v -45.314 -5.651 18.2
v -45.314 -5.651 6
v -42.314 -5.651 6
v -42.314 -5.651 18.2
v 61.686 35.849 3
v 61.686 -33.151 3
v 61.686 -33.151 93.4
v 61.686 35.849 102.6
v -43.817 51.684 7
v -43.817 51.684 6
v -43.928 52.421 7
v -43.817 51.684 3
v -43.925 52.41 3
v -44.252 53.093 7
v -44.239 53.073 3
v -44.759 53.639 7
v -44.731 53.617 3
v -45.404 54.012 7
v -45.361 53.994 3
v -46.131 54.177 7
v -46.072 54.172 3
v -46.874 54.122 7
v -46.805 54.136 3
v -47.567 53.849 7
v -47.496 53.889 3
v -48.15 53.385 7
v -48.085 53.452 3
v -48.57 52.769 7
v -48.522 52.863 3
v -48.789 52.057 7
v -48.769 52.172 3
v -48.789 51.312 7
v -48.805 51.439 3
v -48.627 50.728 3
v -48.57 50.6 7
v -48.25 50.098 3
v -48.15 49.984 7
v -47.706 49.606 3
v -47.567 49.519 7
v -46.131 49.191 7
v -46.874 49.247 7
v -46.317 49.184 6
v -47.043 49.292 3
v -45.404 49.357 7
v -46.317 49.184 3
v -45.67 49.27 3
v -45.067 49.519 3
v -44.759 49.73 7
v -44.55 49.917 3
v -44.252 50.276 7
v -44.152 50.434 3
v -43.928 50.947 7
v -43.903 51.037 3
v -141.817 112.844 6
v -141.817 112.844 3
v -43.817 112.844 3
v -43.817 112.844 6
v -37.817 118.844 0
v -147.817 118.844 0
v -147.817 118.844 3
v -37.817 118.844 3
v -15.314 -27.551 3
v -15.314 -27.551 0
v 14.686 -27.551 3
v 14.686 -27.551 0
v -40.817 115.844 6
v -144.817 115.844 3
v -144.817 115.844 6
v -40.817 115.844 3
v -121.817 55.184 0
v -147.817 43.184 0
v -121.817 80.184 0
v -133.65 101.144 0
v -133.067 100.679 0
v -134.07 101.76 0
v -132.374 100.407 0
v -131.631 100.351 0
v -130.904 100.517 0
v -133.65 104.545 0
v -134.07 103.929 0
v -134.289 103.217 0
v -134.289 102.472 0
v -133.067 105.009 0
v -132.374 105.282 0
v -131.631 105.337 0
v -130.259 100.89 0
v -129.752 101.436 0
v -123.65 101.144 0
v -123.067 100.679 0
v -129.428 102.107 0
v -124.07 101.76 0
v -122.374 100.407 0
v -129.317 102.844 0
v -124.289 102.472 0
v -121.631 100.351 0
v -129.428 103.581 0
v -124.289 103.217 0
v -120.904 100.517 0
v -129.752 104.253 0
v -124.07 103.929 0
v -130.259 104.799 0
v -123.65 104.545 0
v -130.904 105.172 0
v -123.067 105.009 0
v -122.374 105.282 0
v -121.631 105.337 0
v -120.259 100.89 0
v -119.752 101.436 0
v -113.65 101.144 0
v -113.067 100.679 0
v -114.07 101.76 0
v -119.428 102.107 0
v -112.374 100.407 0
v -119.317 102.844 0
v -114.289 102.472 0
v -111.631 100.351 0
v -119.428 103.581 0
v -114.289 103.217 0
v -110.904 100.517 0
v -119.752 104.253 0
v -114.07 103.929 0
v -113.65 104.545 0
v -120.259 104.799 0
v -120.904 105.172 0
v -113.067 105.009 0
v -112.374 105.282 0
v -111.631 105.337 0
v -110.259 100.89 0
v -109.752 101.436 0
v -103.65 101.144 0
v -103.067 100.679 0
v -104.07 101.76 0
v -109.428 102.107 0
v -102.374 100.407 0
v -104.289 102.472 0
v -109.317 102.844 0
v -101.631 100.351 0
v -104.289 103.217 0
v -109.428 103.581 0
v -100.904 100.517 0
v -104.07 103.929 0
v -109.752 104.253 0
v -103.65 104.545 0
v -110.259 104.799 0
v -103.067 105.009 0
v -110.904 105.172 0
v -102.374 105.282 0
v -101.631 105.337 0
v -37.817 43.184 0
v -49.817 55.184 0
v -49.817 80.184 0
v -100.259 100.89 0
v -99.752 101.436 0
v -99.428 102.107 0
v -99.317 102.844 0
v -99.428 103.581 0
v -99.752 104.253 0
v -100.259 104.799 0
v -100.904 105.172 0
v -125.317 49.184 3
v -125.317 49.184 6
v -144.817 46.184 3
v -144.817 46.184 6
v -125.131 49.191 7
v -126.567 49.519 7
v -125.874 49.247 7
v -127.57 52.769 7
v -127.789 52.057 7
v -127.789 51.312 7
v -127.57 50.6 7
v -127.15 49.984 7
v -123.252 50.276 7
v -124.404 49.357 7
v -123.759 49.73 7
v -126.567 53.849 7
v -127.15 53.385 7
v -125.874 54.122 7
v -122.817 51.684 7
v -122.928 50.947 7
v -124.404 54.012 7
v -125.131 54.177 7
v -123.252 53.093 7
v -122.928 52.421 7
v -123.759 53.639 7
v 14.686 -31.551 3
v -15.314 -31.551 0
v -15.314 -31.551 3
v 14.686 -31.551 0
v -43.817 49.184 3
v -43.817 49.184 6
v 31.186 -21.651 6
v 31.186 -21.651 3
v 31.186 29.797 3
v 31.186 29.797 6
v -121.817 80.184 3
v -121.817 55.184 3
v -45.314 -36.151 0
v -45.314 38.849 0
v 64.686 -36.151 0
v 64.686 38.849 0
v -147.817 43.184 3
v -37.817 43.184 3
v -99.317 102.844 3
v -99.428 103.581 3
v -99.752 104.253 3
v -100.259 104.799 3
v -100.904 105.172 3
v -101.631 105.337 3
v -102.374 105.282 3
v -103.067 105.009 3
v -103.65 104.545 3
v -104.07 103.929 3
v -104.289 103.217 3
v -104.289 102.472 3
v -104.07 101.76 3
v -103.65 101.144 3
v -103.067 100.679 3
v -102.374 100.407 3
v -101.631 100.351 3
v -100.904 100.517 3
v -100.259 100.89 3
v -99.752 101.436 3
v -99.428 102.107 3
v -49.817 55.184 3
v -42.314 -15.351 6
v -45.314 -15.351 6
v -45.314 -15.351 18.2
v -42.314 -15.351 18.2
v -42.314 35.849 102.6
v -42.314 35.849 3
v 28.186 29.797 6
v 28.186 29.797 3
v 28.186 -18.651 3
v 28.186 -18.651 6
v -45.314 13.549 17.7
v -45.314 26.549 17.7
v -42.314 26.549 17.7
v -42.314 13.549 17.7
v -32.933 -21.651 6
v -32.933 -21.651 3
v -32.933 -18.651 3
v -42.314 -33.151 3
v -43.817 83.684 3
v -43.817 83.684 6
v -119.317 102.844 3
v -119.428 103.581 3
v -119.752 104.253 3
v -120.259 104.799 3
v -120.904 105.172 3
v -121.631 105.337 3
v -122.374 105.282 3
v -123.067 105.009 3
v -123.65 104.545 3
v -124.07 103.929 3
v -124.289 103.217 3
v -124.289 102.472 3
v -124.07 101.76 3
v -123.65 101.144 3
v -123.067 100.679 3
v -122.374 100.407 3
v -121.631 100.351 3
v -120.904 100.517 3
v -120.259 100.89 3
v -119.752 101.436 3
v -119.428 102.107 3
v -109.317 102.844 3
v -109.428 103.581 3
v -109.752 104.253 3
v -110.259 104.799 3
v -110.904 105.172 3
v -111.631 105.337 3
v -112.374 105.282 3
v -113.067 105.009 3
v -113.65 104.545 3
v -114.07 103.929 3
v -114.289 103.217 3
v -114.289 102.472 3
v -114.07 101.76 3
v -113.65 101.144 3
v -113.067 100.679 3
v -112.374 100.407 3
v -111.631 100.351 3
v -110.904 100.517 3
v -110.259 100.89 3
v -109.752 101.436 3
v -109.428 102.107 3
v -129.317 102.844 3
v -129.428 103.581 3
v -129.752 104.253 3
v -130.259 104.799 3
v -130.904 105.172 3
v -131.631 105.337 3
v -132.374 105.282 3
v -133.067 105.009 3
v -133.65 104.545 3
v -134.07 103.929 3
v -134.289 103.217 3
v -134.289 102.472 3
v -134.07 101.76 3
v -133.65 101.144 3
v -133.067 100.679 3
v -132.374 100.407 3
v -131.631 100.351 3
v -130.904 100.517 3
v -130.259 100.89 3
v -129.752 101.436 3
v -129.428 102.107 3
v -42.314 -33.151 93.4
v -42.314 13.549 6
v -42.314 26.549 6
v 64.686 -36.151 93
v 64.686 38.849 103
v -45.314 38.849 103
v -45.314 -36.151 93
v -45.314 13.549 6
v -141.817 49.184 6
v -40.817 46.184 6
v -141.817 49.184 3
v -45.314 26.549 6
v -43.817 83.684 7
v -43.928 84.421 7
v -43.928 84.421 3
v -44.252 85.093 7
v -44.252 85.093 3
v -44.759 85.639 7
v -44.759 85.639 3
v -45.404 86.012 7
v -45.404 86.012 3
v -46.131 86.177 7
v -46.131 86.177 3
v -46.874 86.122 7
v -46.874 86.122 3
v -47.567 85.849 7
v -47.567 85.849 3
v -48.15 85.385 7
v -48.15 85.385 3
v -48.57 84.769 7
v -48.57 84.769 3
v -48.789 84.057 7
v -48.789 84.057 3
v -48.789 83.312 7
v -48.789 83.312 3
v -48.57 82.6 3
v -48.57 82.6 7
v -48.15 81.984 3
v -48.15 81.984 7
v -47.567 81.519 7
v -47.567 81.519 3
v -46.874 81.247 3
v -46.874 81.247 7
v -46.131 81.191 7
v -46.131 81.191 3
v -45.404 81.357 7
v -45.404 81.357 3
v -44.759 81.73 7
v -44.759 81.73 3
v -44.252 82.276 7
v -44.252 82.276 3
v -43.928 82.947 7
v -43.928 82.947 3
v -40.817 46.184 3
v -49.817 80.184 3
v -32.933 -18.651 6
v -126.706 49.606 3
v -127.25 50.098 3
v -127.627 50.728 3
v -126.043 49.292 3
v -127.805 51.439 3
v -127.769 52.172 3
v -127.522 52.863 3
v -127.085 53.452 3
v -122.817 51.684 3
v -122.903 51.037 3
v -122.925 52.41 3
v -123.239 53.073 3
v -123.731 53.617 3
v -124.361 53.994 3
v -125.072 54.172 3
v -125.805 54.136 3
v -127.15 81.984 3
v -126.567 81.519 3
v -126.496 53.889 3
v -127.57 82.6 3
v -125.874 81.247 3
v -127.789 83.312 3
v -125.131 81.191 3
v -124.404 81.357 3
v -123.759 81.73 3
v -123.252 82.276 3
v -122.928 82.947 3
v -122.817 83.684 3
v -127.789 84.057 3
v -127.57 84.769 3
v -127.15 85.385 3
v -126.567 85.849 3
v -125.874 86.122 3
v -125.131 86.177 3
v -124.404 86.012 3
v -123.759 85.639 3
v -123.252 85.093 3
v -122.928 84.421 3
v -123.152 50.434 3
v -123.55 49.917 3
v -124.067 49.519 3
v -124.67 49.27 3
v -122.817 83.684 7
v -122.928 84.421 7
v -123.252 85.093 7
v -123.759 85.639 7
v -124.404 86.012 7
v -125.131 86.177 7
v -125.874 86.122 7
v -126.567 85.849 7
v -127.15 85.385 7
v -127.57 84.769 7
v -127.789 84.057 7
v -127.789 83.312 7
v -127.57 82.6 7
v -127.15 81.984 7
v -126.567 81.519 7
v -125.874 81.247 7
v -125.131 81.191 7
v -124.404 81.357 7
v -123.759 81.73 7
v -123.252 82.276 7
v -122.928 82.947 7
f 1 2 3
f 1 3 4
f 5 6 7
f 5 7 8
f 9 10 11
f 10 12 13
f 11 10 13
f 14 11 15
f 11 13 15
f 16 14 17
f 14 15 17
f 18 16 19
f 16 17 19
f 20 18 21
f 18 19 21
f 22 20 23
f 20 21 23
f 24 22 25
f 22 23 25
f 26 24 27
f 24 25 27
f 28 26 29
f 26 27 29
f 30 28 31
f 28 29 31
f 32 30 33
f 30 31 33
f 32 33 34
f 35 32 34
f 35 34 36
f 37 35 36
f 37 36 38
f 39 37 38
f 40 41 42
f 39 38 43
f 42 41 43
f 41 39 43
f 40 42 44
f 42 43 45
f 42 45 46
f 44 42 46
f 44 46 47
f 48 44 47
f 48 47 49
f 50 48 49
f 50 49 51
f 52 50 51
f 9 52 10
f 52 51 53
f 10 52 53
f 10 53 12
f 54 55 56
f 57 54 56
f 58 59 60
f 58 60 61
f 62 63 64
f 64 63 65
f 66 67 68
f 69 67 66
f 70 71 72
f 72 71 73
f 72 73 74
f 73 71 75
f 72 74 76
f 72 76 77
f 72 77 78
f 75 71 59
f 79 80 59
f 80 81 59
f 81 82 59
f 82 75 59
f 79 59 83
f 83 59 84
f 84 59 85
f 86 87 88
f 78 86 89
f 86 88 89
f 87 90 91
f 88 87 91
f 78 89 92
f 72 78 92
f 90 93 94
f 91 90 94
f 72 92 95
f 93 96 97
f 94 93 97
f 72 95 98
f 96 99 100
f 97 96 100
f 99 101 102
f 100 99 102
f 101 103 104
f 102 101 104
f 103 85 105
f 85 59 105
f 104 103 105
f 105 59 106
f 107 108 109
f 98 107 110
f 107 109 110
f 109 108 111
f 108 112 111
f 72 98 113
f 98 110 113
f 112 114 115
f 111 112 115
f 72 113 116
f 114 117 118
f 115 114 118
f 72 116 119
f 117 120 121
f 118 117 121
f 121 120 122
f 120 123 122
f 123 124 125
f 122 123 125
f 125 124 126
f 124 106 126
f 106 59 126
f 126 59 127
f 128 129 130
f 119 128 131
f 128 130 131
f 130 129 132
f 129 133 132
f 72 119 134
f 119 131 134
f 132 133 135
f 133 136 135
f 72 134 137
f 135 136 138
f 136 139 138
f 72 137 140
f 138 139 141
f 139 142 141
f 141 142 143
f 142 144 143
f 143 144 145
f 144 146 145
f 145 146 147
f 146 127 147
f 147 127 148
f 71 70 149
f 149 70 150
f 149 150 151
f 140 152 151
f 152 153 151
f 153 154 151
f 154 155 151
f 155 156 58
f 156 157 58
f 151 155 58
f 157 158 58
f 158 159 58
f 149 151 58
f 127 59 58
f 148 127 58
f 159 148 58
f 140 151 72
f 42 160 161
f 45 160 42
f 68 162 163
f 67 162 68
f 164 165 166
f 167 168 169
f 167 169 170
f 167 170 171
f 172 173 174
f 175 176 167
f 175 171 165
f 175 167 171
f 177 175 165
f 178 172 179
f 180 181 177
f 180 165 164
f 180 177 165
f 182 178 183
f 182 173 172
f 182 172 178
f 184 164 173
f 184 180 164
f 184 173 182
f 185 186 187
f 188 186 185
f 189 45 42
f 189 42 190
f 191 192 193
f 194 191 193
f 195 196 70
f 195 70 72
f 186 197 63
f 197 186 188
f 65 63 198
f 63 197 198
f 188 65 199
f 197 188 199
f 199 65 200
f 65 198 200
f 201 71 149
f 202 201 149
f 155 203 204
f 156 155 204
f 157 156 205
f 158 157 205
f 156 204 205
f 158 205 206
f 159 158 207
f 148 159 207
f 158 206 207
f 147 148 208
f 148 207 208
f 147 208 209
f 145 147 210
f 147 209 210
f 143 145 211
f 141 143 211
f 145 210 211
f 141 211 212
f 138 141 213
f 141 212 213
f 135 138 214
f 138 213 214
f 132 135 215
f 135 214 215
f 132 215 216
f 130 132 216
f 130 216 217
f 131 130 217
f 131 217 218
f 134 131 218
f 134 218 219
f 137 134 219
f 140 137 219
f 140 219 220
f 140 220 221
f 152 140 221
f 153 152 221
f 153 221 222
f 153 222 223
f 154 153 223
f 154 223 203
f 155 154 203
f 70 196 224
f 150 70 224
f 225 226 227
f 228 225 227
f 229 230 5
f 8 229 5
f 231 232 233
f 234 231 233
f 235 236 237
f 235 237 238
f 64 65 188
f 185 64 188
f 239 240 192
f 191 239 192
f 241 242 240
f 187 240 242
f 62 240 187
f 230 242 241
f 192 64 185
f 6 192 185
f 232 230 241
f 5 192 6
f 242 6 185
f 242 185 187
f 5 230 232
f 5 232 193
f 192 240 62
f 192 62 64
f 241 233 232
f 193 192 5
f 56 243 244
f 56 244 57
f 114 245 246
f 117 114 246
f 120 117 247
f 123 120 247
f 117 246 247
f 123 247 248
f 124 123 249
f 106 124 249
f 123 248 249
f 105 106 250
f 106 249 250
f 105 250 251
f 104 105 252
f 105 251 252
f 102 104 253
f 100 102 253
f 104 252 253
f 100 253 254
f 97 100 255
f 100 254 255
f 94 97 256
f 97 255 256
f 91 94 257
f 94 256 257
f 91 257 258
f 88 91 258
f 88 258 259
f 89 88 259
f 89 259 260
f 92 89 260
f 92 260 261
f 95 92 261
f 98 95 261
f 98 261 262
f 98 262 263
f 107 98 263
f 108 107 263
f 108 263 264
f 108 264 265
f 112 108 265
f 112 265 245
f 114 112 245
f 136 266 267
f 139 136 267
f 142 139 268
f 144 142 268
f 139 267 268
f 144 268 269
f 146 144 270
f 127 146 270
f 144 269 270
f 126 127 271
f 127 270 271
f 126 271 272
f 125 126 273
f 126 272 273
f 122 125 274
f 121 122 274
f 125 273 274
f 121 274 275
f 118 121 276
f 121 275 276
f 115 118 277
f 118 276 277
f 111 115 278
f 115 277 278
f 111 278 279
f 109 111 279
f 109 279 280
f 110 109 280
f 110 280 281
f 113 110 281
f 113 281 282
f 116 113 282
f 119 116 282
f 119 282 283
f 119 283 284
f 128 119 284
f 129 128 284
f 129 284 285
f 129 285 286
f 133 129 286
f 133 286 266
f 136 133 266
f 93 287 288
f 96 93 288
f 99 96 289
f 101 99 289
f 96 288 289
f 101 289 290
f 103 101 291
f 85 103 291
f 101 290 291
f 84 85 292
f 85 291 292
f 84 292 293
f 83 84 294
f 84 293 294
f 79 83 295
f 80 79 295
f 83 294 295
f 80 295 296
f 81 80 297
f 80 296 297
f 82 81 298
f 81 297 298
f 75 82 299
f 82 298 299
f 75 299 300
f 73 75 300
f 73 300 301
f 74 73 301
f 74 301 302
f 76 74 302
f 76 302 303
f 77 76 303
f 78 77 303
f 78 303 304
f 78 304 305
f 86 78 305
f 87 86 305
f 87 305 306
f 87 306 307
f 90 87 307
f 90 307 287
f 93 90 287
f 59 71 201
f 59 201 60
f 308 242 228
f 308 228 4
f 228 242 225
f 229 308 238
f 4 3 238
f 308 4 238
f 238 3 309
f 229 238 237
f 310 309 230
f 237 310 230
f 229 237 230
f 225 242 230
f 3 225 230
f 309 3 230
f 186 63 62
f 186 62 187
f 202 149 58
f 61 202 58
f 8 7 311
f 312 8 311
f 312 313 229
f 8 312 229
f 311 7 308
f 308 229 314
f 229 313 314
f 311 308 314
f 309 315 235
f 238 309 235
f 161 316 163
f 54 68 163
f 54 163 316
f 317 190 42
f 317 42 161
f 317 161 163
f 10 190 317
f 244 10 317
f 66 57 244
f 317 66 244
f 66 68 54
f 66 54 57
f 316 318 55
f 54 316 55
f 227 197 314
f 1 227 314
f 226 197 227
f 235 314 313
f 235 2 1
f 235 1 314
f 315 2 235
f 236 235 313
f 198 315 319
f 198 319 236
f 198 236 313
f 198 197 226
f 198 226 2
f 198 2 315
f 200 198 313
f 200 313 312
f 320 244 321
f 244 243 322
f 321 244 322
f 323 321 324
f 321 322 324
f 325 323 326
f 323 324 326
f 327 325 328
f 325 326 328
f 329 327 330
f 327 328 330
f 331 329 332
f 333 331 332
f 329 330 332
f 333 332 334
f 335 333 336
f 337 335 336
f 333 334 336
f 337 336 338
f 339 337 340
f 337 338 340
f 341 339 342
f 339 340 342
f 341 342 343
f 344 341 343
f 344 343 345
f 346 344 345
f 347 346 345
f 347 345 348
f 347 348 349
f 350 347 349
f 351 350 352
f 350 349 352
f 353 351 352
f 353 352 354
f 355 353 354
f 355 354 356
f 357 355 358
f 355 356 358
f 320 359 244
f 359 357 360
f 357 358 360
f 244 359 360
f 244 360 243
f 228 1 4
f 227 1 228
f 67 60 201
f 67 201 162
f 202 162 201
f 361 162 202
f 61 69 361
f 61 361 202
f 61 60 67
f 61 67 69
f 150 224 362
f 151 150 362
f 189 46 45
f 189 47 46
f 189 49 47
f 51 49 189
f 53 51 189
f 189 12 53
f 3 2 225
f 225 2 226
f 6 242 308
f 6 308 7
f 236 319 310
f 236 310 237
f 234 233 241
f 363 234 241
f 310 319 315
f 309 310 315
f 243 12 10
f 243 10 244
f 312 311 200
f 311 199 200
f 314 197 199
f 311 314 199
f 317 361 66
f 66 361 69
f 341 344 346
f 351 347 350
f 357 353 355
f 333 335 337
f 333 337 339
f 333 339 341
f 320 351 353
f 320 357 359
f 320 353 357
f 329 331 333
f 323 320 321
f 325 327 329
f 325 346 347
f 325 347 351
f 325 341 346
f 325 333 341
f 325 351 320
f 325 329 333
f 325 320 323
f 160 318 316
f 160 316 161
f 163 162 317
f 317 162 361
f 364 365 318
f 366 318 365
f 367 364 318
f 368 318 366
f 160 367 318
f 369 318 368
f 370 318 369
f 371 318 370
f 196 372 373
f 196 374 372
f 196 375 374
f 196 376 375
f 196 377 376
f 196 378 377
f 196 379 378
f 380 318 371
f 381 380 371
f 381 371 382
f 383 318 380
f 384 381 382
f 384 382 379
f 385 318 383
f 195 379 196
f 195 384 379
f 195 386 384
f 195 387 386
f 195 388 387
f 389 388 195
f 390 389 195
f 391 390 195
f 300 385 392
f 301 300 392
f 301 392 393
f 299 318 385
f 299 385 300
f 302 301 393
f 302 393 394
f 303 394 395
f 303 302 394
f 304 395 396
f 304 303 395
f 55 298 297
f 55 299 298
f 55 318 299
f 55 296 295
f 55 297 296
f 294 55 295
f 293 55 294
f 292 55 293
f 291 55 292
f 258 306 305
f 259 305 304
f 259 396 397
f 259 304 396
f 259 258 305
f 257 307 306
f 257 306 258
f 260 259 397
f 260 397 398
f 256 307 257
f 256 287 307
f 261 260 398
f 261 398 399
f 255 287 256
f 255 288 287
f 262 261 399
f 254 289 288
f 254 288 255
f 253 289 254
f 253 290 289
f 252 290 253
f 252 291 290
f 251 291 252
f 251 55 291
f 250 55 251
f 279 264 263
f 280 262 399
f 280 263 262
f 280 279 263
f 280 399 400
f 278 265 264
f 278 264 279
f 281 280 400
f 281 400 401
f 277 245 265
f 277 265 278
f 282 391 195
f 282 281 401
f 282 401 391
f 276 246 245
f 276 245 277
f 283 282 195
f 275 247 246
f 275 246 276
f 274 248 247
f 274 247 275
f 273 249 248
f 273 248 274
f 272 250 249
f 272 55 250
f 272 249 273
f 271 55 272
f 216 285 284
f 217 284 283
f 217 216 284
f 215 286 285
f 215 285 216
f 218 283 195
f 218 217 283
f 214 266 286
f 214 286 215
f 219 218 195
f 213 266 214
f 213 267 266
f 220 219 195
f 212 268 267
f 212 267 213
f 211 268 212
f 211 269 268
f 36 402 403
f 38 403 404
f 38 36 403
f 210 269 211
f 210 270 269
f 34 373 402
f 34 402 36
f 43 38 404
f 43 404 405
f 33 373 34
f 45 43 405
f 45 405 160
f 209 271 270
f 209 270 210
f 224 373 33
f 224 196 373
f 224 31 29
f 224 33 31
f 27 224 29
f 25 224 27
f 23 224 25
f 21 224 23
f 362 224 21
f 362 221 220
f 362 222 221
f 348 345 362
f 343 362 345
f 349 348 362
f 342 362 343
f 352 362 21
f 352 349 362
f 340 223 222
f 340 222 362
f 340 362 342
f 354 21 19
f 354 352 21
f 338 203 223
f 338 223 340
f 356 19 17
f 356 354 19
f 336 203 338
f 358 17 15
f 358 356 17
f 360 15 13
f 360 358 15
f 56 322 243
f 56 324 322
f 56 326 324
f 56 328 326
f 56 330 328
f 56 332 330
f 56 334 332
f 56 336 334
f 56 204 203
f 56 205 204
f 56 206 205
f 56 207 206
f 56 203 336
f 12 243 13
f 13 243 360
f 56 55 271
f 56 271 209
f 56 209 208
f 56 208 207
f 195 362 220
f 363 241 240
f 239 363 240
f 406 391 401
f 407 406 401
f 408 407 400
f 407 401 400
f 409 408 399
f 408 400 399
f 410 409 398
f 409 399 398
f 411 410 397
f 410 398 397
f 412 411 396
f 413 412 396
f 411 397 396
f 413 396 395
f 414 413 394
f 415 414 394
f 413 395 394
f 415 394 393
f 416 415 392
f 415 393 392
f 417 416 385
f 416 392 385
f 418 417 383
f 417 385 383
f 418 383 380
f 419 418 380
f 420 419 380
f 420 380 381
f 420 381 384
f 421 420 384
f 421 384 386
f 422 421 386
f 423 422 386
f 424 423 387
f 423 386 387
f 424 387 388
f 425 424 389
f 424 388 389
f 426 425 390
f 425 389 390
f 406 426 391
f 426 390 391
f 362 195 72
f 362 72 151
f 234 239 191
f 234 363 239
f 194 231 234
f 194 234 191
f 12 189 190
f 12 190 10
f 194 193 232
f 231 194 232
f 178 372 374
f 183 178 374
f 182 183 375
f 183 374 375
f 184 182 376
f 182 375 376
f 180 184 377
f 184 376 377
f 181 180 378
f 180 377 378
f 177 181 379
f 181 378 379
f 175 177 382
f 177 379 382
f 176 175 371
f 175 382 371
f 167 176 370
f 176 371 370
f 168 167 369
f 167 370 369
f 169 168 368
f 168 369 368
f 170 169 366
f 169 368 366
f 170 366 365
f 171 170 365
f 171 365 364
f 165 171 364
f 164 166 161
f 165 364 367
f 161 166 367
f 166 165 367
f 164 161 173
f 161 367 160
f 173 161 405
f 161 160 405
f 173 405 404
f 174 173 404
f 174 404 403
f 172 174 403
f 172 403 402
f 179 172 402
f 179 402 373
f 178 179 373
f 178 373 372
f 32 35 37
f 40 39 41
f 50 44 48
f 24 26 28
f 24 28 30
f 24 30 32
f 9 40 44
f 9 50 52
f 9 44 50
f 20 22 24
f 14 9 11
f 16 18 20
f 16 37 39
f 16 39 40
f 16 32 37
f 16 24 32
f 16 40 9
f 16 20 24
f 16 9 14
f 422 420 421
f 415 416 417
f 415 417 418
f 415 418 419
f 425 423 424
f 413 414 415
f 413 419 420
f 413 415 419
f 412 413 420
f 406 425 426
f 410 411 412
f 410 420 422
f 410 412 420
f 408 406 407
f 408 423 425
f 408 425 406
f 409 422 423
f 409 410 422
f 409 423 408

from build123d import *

# Parameters (mm, degrees)
SKETCH_W        = 110
SKETCH_H        = 75
PAD_DEPTH       = 3
SKETCH001_W     = 110
SKETCH001_H     = 75
SKETCH001_W_2   = 104
SKETCH001_H_2   = 69
PAD001_DEPTH    = 100
POCKET_DEPTH    = 120
SKETCH003_W     = 13
SKETCH003_H     = 11.7
POCKET001_DEPTH = 5
SKETCH004_W     = 9.7
SKETCH004_H     = 12.2
POCKET002_DEPTH = 5
SKETCH005_W     = 30
SKETCH005_H     = 4
POCKET003_DEPTH = 5
PAD002_DEPTH    = 3
SKETCH007_W     = 110
SKETCH007_H     = 75.66
PAD003_DEPTH    = 3
SKETCH009_W     = 104
SKETCH009_H     = 69.66
SKETCH009_W_2   = 98
SKETCH009_H_2   = 63.66
PAD004_DEPTH    = 3
SKETCH010_W     = 72
SKETCH010_H     = 25
POCKET004_DEPTH = 5
SKETCH011_R     = 2.5
POCKET005_DEPTH = 5
SKETCH012_R     = 2.5
PAD005_DEPTH    = 4


with BuildPart() as box:
    # Sketch → Pad (new body)
    with BuildSketch(Plane.XY):
        with Locations((9.68629, 1.349086)):
            Rectangle(SKETCH_W, SKETCH_H)
    extrude(amount=PAD_DEPTH)

    # Sketch001 (on Face6 of Pad) → Pad001 (join)
    with BuildSketch(Plane.XY.offset(3)):
        with Locations((9.68629, 1.349086)):
            Rectangle(SKETCH001_W, SKETCH001_H)
        with Locations((9.68629, 1.349086)):
            Rectangle(SKETCH001_W_2, SKETCH001_H_2, mode=Mode.SUBTRACT)
    extrude(amount=PAD001_DEPTH)

    # Sketch002 (on Face7 of Pad001) → Pocket (cut)
    with BuildSketch(Plane(origin=(-45.31371, 0, 0), x_dir=(0, -1, 0), z_dir=(-1, 0, 0))):
        Polygon((-38.849086, 103), (36.150914, 93), (36.150914, 103), align=None)
    extrude(amount=-POCKET_DEPTH, mode=Mode.SUBTRACT)

    # Sketch003 (on Face7 of Pocket) → Pocket001 (cut)
    with BuildSketch(Plane(origin=(-45.31371, 0, 0), x_dir=(0, -1, 0), z_dir=(-1, 0, 0))):
        with Locations((-20.049086, 11.85)):
            Rectangle(SKETCH003_W, SKETCH003_H)
    extrude(amount=-POCKET001_DEPTH, mode=Mode.SUBTRACT)

    # Sketch004 (on Face7 of Pocket001) → Pocket002 (cut)
    with BuildSketch(Plane(origin=(-45.31371, 0, 0), x_dir=(0, -1, 0), z_dir=(-1, 0, 0))):
        with Locations((10.500914, 12.1)):
            Rectangle(SKETCH004_W, SKETCH004_H)
    extrude(amount=-POCKET002_DEPTH, mode=Mode.SUBTRACT)

    # Sketch005 (on Face4 of Pocket002) → Pocket003 (cut)
    with BuildSketch(Plane(origin=(0, 0, 0), x_dir=(1, 0, 0), z_dir=(0, 0, -1))):
        with Locations((-0.31371, 29.550914)):
            Rectangle(SKETCH005_W, SKETCH005_H)
    extrude(amount=-POCKET003_DEPTH, mode=Mode.SUBTRACT)

    # Sketch006 (on Face23 of Pocket003) → Pad002 (join)
    with BuildSketch(Plane.XY.offset(3)):
        Polygon((-32.933384, -21.650914), (31.18629, -21.650914), (31.18629, 29.796738), (28.18629, 29.796738), (28.18629, -18.650914), (-32.933384, -18.650914), align=None)
    extrude(amount=PAD002_DEPTH)


with BuildPart() as lid:
    # Sketch007 → Pad003 (new body)
    with BuildSketch(Plane.XY):
        with Locations((-92.817357, 81.01438)):
            Rectangle(SKETCH007_W, SKETCH007_H)
    extrude(amount=PAD003_DEPTH)

    # Sketch009 (on Face6 of Pad003) → Pad004 (join)
    with BuildSketch(Plane.XY.offset(3)):
        with Locations((-92.817357, 81.01438)):
            Rectangle(SKETCH009_W, SKETCH009_H)
        with Locations((-92.817357, 81.01438)):
            Rectangle(SKETCH009_W_2, SKETCH009_H_2, mode=Mode.SUBTRACT)
    extrude(amount=PAD004_DEPTH)

    # Sketch010 (on Face16 of Pad004) → Pocket004 (cut)
    with BuildSketch(Plane.XY.offset(3)):
        with Locations((-85.817357, 67.68438)):
            Rectangle(SKETCH010_W, SKETCH010_H)
    extrude(amount=-POCKET004_DEPTH, mode=Mode.SUBTRACT)

    # Sketch011 (on Face15 of Pocket004) → Pocket005 (cut)
    with BuildSketch(Plane.XY.offset(3)):
        with Locations((-131.817357, 102.84438)):
            Circle(SKETCH011_R)
        with Locations((-121.817357, 102.84438)):
            Circle(SKETCH011_R)
        with Locations((-111.817357, 102.84438)):
            Circle(SKETCH011_R)
        with Locations((-101.817357, 102.84438)):
            Circle(SKETCH011_R)
    extrude(amount=-POCKET005_DEPTH, mode=Mode.SUBTRACT)

    # Sketch012 (on Face19 of Pocket005) → Pad005 (join)
    with BuildSketch(Plane.XY.offset(3)):
        with Locations((-125.317357, 83.68438)):
            Circle(SKETCH012_R)
        with Locations((-46.317357, 83.68438)):
            Circle(SKETCH012_R)
        with Locations((-46.317357, 51.68438)):
            Circle(SKETCH012_R)
        with Locations((-125.317357, 51.68438)):
            Circle(SKETCH012_R)
    extrude(amount=PAD005_DEPTH)


solid = Compound([box.part, lid.part])
